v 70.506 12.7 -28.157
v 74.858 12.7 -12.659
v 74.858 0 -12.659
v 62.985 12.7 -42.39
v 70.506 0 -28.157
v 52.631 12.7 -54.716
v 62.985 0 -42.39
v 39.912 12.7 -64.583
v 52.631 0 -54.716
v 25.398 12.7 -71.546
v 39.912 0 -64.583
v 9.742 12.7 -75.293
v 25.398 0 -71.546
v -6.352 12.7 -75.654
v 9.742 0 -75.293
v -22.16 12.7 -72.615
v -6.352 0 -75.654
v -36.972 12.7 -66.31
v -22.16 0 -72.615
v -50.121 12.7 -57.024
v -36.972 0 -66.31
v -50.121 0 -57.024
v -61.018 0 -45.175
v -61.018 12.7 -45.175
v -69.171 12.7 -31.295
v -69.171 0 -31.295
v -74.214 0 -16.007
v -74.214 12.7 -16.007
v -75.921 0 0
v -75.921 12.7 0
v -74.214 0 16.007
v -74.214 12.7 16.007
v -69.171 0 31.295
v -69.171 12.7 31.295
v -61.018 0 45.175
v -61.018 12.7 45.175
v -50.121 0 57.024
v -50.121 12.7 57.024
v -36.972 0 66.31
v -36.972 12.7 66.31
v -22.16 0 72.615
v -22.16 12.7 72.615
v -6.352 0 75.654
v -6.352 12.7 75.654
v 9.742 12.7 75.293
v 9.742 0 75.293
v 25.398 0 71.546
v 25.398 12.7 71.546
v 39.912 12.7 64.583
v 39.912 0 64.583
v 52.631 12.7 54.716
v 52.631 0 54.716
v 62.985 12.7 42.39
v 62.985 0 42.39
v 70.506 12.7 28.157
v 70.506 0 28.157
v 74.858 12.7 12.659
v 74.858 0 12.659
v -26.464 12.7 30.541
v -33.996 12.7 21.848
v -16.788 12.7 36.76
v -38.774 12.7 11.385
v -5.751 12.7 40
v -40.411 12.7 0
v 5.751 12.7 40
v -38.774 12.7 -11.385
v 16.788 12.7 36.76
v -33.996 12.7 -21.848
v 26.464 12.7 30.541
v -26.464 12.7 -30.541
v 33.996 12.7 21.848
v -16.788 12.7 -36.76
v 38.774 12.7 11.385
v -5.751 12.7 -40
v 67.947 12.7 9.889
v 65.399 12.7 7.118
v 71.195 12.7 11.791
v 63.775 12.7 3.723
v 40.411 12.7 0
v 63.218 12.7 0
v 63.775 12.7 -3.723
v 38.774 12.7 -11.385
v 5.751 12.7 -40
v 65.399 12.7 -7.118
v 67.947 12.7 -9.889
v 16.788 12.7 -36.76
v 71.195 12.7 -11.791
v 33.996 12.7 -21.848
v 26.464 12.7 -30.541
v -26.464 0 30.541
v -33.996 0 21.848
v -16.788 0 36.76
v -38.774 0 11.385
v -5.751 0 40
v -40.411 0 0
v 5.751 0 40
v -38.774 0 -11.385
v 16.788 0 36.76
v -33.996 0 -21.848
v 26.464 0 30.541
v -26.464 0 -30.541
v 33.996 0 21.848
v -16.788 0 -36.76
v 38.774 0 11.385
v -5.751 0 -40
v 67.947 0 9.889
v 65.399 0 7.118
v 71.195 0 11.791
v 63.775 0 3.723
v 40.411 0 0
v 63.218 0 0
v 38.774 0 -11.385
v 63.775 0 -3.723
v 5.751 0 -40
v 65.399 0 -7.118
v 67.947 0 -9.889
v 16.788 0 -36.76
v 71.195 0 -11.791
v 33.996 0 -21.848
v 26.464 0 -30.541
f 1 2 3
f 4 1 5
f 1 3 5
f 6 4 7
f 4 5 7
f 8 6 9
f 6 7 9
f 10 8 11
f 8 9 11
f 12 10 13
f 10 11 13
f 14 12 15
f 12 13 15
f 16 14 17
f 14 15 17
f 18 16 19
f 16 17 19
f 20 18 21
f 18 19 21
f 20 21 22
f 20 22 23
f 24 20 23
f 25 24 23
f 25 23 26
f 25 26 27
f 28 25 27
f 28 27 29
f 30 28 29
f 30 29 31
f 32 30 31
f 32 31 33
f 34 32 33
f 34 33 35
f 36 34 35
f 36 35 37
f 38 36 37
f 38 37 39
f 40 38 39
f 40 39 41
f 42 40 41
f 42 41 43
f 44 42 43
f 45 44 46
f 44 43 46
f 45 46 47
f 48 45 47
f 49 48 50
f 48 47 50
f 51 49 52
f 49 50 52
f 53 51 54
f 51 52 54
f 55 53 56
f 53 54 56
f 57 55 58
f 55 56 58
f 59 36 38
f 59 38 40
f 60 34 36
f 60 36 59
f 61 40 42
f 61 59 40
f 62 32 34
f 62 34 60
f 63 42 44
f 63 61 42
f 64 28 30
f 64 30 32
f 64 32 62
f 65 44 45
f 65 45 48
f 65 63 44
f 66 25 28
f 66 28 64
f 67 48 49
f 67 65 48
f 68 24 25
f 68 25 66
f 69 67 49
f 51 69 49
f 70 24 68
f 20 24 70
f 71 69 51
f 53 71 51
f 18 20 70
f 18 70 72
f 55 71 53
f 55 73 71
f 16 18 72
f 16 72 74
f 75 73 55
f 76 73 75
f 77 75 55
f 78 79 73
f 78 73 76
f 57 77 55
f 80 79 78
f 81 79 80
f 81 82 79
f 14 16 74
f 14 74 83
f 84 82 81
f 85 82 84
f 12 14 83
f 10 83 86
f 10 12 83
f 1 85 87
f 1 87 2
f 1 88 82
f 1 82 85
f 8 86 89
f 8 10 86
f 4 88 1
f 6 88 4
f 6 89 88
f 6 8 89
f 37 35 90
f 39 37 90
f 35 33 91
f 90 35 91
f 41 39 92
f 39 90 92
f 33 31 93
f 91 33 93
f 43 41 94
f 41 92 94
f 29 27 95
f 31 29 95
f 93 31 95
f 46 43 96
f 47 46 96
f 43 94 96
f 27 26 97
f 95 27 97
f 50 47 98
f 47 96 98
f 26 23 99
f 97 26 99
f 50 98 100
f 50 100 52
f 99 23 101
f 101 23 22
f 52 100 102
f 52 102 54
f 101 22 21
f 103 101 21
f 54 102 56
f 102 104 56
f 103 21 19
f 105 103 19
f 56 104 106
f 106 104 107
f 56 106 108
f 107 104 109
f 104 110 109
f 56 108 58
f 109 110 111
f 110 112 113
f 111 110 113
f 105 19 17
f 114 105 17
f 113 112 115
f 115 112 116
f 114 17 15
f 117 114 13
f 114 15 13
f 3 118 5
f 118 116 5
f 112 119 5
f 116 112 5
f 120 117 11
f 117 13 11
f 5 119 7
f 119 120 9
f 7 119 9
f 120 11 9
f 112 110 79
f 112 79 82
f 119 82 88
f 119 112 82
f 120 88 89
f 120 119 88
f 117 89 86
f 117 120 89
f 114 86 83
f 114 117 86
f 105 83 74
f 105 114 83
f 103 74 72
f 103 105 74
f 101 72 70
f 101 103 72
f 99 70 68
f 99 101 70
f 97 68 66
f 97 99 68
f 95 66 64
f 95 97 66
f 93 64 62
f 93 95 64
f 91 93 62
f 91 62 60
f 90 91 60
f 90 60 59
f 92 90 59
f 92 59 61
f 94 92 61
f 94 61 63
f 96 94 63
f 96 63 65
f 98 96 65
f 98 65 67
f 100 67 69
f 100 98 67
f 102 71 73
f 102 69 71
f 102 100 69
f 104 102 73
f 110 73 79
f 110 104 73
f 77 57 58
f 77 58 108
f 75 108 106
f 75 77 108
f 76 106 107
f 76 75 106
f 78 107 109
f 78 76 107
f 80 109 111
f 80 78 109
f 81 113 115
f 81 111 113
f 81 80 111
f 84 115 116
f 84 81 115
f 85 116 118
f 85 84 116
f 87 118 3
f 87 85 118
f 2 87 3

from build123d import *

# Parameters (mm, degrees)
SKETCH1_R           = 75.9206
BOSS_EXTRUDE1_DEPTH = 12.7
SKETCH1_10_R        = 40.4114
CUT_EXTRUDE2_DEPTH  = 13.7
CUT_EXTRUDE3_DEPTH  = 13.7


with BuildPart() as part:
    # Sketch1 → Boss-Extrude1 (new body)
    with BuildSketch(Plane(origin=(0, 0, 0), x_dir=(1, 0, 0), z_dir=(0, 1, 0))):
        Circle(SKETCH1_R)
    extrude(amount=BOSS_EXTRUDE1_DEPTH)

    # Sketch1<10> → Cut-Extrude2 (cut, through all)
    with BuildSketch(Plane(origin=(0, 0, 0), x_dir=(1, 0, 0), z_dir=(0, 1, 0))):
        Circle(SKETCH1_10_R)
    extrude(amount=CUT_EXTRUDE2_DEPTH, mode=Mode.SUBTRACT)

    # Sketch2 → Cut-Extrude3 (cut, through all)
    with BuildSketch(Plane(origin=(0, 12.7, 0), x_dir=(1, 0, 0), z_dir=(0, 1, 0))):
        with BuildLine():
            Line((76.2, 12.7), (76.2, -12.7))
            ThreePointArc((76.2, -12.7), (63.217526972, 0), (76.2, 12.7))
        make_face()
    extrude(amount=-CUT_EXTRUDE3_DEPTH, mode=Mode.SUBTRACT)


solid = part.part
